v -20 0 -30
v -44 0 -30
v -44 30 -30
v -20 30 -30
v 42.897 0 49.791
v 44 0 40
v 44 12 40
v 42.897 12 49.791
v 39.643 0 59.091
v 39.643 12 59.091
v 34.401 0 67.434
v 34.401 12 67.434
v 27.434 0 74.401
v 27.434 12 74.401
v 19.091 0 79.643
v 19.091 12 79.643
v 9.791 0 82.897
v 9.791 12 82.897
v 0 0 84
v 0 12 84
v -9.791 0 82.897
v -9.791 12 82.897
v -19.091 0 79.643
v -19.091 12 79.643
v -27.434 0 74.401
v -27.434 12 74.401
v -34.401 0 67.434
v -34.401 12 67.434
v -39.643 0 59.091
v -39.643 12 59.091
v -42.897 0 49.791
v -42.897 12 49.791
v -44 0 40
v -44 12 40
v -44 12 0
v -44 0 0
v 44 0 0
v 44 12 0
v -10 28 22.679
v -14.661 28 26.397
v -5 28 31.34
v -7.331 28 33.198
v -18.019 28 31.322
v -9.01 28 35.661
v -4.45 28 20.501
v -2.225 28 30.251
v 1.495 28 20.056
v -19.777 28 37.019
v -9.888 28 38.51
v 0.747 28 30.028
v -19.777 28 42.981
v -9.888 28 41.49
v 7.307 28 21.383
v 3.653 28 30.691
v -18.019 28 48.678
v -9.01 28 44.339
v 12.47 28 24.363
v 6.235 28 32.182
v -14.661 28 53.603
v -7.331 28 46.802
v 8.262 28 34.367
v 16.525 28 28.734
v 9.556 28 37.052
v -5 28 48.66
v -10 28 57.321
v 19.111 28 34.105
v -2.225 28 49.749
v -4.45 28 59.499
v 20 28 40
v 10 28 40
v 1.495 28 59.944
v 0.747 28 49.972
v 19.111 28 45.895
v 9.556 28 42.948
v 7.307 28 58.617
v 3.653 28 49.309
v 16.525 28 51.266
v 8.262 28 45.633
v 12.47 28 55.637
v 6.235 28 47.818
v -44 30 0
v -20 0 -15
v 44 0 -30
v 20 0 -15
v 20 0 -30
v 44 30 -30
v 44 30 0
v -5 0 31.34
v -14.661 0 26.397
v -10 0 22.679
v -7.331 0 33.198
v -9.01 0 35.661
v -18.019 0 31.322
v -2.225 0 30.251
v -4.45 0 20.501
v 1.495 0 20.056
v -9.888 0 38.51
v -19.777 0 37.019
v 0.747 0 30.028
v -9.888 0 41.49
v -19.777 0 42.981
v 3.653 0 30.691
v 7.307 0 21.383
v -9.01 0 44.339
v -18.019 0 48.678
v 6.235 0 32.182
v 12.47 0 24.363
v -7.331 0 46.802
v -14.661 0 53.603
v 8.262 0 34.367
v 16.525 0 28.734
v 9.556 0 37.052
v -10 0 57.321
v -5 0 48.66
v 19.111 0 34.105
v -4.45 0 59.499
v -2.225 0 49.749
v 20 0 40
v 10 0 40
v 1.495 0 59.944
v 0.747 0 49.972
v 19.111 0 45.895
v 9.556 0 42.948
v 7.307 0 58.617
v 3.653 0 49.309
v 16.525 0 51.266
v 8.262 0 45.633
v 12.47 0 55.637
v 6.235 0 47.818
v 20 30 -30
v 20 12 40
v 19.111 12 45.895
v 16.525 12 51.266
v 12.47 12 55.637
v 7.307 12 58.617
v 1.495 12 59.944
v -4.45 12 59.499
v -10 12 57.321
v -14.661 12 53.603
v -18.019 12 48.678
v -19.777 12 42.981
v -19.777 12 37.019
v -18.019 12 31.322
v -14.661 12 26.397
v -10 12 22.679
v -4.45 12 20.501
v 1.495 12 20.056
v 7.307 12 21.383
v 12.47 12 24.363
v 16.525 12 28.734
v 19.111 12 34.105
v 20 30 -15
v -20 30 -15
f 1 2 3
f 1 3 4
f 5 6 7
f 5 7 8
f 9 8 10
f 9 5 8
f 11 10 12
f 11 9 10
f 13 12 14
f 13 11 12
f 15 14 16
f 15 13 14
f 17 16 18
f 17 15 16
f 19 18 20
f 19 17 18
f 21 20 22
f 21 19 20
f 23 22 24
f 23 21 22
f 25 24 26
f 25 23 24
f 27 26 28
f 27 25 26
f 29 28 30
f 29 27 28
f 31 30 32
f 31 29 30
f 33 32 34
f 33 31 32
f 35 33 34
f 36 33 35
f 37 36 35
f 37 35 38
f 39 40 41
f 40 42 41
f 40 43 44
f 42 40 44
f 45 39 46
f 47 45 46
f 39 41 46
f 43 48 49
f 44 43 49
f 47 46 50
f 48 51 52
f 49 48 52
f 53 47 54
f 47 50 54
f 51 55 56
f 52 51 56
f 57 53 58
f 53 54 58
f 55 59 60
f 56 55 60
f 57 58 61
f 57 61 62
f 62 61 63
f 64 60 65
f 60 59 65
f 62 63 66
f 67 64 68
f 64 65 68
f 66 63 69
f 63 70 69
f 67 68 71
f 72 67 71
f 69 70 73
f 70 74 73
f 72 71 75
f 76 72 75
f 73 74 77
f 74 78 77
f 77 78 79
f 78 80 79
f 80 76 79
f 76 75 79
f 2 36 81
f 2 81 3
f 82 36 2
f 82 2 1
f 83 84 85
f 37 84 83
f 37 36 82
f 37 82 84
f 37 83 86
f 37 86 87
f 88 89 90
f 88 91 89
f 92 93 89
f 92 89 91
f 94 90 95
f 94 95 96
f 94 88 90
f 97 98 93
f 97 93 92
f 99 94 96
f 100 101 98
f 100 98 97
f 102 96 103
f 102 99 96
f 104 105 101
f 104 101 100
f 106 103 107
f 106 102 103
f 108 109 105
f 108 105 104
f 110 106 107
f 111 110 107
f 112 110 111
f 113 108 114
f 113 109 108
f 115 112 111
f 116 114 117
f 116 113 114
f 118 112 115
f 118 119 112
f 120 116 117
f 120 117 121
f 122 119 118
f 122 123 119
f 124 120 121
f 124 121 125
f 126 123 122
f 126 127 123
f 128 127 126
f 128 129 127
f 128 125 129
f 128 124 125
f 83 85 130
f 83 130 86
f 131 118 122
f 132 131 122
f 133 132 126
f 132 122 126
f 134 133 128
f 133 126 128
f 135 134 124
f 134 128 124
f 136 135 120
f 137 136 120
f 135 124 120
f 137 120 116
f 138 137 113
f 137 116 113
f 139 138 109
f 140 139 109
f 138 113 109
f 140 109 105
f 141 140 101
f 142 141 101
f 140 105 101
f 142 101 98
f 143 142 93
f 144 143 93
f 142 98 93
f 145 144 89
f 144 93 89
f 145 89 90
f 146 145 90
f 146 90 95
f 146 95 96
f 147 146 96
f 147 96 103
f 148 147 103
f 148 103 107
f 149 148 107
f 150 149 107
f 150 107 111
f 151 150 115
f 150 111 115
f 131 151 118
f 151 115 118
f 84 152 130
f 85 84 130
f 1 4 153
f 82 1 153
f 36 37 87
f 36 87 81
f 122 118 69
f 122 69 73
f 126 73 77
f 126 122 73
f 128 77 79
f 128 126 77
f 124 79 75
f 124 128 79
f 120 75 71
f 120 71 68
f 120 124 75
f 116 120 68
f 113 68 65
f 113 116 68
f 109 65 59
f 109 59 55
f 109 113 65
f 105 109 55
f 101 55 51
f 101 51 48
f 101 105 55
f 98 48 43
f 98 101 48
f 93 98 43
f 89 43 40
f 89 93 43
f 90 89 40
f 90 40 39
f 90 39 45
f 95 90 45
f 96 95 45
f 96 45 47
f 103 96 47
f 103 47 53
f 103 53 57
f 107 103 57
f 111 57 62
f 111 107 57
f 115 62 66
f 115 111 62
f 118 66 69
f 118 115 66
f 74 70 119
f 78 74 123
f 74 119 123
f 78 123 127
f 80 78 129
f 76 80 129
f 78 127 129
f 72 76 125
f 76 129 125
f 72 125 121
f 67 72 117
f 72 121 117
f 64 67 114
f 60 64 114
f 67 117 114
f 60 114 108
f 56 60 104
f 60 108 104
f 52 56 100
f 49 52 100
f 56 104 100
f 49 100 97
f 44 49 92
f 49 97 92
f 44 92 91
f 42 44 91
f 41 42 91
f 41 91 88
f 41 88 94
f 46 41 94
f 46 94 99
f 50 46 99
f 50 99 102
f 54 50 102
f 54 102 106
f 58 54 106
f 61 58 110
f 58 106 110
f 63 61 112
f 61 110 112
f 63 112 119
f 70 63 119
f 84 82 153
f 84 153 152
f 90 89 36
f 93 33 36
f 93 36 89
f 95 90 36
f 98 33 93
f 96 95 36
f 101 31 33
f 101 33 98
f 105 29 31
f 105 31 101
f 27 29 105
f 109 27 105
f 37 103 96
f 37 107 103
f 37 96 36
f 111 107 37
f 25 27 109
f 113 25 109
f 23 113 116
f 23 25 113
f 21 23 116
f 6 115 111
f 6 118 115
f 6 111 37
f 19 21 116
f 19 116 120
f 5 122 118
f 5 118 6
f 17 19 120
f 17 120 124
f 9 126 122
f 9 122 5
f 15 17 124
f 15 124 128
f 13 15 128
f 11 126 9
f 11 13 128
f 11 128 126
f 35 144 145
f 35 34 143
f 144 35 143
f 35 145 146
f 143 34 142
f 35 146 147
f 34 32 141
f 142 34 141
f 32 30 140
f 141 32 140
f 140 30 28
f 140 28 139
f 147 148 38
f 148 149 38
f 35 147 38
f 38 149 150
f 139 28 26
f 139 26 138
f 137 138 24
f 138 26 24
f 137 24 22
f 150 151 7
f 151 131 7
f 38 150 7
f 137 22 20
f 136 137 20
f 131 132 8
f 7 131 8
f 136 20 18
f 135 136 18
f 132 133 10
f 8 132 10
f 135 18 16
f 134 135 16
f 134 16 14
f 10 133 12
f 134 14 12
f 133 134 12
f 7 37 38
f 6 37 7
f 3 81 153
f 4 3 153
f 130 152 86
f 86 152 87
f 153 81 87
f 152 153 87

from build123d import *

# Parameters (mm, degrees)
F1_DEPTH = 30
F0_R     = 20
F2_DEPTH = 12
F0_R_2   = 10
F3_DEPTH = 28


with BuildPart() as f1:
    # F0 (on Front) → F1 (new body)
    with BuildSketch(Plane.XZ):
        Polygon((-44, 0), (-44, -30), (-20, -30), (-20, -15), (20, -15), (20, -30), (44, -30), (44, 0), align=None)
    extrude(amount=-F1_DEPTH)


with BuildPart() as f2:
    # F0 (on Front) → F2 (new body)
    with BuildSketch(Plane.XZ):
        with BuildLine():
            Line((-44, 40), (-44, 0))
            Line((-44, 0), (44, 0))
            Line((44, 0), (44, 40))
            ThreePointArc((44, 40), (0, 84), (-44, 40))
        make_face()
        with Locations((0, 40)):
            Circle(F0_R, mode=Mode.SUBTRACT)
    extrude(amount=-F2_DEPTH)


with BuildPart() as f3:
    # F0 (on Front) → F3 (new body)
    with BuildSketch(Plane.XZ):
        with Locations((0, 40)):
            Circle(F0_R)
        with Locations((0, 40)):
            Circle(F0_R_2, mode=Mode.SUBTRACT)
    extrude(amount=-F3_DEPTH)


solid = Compound([f1.part, f2.part, f3.part])
